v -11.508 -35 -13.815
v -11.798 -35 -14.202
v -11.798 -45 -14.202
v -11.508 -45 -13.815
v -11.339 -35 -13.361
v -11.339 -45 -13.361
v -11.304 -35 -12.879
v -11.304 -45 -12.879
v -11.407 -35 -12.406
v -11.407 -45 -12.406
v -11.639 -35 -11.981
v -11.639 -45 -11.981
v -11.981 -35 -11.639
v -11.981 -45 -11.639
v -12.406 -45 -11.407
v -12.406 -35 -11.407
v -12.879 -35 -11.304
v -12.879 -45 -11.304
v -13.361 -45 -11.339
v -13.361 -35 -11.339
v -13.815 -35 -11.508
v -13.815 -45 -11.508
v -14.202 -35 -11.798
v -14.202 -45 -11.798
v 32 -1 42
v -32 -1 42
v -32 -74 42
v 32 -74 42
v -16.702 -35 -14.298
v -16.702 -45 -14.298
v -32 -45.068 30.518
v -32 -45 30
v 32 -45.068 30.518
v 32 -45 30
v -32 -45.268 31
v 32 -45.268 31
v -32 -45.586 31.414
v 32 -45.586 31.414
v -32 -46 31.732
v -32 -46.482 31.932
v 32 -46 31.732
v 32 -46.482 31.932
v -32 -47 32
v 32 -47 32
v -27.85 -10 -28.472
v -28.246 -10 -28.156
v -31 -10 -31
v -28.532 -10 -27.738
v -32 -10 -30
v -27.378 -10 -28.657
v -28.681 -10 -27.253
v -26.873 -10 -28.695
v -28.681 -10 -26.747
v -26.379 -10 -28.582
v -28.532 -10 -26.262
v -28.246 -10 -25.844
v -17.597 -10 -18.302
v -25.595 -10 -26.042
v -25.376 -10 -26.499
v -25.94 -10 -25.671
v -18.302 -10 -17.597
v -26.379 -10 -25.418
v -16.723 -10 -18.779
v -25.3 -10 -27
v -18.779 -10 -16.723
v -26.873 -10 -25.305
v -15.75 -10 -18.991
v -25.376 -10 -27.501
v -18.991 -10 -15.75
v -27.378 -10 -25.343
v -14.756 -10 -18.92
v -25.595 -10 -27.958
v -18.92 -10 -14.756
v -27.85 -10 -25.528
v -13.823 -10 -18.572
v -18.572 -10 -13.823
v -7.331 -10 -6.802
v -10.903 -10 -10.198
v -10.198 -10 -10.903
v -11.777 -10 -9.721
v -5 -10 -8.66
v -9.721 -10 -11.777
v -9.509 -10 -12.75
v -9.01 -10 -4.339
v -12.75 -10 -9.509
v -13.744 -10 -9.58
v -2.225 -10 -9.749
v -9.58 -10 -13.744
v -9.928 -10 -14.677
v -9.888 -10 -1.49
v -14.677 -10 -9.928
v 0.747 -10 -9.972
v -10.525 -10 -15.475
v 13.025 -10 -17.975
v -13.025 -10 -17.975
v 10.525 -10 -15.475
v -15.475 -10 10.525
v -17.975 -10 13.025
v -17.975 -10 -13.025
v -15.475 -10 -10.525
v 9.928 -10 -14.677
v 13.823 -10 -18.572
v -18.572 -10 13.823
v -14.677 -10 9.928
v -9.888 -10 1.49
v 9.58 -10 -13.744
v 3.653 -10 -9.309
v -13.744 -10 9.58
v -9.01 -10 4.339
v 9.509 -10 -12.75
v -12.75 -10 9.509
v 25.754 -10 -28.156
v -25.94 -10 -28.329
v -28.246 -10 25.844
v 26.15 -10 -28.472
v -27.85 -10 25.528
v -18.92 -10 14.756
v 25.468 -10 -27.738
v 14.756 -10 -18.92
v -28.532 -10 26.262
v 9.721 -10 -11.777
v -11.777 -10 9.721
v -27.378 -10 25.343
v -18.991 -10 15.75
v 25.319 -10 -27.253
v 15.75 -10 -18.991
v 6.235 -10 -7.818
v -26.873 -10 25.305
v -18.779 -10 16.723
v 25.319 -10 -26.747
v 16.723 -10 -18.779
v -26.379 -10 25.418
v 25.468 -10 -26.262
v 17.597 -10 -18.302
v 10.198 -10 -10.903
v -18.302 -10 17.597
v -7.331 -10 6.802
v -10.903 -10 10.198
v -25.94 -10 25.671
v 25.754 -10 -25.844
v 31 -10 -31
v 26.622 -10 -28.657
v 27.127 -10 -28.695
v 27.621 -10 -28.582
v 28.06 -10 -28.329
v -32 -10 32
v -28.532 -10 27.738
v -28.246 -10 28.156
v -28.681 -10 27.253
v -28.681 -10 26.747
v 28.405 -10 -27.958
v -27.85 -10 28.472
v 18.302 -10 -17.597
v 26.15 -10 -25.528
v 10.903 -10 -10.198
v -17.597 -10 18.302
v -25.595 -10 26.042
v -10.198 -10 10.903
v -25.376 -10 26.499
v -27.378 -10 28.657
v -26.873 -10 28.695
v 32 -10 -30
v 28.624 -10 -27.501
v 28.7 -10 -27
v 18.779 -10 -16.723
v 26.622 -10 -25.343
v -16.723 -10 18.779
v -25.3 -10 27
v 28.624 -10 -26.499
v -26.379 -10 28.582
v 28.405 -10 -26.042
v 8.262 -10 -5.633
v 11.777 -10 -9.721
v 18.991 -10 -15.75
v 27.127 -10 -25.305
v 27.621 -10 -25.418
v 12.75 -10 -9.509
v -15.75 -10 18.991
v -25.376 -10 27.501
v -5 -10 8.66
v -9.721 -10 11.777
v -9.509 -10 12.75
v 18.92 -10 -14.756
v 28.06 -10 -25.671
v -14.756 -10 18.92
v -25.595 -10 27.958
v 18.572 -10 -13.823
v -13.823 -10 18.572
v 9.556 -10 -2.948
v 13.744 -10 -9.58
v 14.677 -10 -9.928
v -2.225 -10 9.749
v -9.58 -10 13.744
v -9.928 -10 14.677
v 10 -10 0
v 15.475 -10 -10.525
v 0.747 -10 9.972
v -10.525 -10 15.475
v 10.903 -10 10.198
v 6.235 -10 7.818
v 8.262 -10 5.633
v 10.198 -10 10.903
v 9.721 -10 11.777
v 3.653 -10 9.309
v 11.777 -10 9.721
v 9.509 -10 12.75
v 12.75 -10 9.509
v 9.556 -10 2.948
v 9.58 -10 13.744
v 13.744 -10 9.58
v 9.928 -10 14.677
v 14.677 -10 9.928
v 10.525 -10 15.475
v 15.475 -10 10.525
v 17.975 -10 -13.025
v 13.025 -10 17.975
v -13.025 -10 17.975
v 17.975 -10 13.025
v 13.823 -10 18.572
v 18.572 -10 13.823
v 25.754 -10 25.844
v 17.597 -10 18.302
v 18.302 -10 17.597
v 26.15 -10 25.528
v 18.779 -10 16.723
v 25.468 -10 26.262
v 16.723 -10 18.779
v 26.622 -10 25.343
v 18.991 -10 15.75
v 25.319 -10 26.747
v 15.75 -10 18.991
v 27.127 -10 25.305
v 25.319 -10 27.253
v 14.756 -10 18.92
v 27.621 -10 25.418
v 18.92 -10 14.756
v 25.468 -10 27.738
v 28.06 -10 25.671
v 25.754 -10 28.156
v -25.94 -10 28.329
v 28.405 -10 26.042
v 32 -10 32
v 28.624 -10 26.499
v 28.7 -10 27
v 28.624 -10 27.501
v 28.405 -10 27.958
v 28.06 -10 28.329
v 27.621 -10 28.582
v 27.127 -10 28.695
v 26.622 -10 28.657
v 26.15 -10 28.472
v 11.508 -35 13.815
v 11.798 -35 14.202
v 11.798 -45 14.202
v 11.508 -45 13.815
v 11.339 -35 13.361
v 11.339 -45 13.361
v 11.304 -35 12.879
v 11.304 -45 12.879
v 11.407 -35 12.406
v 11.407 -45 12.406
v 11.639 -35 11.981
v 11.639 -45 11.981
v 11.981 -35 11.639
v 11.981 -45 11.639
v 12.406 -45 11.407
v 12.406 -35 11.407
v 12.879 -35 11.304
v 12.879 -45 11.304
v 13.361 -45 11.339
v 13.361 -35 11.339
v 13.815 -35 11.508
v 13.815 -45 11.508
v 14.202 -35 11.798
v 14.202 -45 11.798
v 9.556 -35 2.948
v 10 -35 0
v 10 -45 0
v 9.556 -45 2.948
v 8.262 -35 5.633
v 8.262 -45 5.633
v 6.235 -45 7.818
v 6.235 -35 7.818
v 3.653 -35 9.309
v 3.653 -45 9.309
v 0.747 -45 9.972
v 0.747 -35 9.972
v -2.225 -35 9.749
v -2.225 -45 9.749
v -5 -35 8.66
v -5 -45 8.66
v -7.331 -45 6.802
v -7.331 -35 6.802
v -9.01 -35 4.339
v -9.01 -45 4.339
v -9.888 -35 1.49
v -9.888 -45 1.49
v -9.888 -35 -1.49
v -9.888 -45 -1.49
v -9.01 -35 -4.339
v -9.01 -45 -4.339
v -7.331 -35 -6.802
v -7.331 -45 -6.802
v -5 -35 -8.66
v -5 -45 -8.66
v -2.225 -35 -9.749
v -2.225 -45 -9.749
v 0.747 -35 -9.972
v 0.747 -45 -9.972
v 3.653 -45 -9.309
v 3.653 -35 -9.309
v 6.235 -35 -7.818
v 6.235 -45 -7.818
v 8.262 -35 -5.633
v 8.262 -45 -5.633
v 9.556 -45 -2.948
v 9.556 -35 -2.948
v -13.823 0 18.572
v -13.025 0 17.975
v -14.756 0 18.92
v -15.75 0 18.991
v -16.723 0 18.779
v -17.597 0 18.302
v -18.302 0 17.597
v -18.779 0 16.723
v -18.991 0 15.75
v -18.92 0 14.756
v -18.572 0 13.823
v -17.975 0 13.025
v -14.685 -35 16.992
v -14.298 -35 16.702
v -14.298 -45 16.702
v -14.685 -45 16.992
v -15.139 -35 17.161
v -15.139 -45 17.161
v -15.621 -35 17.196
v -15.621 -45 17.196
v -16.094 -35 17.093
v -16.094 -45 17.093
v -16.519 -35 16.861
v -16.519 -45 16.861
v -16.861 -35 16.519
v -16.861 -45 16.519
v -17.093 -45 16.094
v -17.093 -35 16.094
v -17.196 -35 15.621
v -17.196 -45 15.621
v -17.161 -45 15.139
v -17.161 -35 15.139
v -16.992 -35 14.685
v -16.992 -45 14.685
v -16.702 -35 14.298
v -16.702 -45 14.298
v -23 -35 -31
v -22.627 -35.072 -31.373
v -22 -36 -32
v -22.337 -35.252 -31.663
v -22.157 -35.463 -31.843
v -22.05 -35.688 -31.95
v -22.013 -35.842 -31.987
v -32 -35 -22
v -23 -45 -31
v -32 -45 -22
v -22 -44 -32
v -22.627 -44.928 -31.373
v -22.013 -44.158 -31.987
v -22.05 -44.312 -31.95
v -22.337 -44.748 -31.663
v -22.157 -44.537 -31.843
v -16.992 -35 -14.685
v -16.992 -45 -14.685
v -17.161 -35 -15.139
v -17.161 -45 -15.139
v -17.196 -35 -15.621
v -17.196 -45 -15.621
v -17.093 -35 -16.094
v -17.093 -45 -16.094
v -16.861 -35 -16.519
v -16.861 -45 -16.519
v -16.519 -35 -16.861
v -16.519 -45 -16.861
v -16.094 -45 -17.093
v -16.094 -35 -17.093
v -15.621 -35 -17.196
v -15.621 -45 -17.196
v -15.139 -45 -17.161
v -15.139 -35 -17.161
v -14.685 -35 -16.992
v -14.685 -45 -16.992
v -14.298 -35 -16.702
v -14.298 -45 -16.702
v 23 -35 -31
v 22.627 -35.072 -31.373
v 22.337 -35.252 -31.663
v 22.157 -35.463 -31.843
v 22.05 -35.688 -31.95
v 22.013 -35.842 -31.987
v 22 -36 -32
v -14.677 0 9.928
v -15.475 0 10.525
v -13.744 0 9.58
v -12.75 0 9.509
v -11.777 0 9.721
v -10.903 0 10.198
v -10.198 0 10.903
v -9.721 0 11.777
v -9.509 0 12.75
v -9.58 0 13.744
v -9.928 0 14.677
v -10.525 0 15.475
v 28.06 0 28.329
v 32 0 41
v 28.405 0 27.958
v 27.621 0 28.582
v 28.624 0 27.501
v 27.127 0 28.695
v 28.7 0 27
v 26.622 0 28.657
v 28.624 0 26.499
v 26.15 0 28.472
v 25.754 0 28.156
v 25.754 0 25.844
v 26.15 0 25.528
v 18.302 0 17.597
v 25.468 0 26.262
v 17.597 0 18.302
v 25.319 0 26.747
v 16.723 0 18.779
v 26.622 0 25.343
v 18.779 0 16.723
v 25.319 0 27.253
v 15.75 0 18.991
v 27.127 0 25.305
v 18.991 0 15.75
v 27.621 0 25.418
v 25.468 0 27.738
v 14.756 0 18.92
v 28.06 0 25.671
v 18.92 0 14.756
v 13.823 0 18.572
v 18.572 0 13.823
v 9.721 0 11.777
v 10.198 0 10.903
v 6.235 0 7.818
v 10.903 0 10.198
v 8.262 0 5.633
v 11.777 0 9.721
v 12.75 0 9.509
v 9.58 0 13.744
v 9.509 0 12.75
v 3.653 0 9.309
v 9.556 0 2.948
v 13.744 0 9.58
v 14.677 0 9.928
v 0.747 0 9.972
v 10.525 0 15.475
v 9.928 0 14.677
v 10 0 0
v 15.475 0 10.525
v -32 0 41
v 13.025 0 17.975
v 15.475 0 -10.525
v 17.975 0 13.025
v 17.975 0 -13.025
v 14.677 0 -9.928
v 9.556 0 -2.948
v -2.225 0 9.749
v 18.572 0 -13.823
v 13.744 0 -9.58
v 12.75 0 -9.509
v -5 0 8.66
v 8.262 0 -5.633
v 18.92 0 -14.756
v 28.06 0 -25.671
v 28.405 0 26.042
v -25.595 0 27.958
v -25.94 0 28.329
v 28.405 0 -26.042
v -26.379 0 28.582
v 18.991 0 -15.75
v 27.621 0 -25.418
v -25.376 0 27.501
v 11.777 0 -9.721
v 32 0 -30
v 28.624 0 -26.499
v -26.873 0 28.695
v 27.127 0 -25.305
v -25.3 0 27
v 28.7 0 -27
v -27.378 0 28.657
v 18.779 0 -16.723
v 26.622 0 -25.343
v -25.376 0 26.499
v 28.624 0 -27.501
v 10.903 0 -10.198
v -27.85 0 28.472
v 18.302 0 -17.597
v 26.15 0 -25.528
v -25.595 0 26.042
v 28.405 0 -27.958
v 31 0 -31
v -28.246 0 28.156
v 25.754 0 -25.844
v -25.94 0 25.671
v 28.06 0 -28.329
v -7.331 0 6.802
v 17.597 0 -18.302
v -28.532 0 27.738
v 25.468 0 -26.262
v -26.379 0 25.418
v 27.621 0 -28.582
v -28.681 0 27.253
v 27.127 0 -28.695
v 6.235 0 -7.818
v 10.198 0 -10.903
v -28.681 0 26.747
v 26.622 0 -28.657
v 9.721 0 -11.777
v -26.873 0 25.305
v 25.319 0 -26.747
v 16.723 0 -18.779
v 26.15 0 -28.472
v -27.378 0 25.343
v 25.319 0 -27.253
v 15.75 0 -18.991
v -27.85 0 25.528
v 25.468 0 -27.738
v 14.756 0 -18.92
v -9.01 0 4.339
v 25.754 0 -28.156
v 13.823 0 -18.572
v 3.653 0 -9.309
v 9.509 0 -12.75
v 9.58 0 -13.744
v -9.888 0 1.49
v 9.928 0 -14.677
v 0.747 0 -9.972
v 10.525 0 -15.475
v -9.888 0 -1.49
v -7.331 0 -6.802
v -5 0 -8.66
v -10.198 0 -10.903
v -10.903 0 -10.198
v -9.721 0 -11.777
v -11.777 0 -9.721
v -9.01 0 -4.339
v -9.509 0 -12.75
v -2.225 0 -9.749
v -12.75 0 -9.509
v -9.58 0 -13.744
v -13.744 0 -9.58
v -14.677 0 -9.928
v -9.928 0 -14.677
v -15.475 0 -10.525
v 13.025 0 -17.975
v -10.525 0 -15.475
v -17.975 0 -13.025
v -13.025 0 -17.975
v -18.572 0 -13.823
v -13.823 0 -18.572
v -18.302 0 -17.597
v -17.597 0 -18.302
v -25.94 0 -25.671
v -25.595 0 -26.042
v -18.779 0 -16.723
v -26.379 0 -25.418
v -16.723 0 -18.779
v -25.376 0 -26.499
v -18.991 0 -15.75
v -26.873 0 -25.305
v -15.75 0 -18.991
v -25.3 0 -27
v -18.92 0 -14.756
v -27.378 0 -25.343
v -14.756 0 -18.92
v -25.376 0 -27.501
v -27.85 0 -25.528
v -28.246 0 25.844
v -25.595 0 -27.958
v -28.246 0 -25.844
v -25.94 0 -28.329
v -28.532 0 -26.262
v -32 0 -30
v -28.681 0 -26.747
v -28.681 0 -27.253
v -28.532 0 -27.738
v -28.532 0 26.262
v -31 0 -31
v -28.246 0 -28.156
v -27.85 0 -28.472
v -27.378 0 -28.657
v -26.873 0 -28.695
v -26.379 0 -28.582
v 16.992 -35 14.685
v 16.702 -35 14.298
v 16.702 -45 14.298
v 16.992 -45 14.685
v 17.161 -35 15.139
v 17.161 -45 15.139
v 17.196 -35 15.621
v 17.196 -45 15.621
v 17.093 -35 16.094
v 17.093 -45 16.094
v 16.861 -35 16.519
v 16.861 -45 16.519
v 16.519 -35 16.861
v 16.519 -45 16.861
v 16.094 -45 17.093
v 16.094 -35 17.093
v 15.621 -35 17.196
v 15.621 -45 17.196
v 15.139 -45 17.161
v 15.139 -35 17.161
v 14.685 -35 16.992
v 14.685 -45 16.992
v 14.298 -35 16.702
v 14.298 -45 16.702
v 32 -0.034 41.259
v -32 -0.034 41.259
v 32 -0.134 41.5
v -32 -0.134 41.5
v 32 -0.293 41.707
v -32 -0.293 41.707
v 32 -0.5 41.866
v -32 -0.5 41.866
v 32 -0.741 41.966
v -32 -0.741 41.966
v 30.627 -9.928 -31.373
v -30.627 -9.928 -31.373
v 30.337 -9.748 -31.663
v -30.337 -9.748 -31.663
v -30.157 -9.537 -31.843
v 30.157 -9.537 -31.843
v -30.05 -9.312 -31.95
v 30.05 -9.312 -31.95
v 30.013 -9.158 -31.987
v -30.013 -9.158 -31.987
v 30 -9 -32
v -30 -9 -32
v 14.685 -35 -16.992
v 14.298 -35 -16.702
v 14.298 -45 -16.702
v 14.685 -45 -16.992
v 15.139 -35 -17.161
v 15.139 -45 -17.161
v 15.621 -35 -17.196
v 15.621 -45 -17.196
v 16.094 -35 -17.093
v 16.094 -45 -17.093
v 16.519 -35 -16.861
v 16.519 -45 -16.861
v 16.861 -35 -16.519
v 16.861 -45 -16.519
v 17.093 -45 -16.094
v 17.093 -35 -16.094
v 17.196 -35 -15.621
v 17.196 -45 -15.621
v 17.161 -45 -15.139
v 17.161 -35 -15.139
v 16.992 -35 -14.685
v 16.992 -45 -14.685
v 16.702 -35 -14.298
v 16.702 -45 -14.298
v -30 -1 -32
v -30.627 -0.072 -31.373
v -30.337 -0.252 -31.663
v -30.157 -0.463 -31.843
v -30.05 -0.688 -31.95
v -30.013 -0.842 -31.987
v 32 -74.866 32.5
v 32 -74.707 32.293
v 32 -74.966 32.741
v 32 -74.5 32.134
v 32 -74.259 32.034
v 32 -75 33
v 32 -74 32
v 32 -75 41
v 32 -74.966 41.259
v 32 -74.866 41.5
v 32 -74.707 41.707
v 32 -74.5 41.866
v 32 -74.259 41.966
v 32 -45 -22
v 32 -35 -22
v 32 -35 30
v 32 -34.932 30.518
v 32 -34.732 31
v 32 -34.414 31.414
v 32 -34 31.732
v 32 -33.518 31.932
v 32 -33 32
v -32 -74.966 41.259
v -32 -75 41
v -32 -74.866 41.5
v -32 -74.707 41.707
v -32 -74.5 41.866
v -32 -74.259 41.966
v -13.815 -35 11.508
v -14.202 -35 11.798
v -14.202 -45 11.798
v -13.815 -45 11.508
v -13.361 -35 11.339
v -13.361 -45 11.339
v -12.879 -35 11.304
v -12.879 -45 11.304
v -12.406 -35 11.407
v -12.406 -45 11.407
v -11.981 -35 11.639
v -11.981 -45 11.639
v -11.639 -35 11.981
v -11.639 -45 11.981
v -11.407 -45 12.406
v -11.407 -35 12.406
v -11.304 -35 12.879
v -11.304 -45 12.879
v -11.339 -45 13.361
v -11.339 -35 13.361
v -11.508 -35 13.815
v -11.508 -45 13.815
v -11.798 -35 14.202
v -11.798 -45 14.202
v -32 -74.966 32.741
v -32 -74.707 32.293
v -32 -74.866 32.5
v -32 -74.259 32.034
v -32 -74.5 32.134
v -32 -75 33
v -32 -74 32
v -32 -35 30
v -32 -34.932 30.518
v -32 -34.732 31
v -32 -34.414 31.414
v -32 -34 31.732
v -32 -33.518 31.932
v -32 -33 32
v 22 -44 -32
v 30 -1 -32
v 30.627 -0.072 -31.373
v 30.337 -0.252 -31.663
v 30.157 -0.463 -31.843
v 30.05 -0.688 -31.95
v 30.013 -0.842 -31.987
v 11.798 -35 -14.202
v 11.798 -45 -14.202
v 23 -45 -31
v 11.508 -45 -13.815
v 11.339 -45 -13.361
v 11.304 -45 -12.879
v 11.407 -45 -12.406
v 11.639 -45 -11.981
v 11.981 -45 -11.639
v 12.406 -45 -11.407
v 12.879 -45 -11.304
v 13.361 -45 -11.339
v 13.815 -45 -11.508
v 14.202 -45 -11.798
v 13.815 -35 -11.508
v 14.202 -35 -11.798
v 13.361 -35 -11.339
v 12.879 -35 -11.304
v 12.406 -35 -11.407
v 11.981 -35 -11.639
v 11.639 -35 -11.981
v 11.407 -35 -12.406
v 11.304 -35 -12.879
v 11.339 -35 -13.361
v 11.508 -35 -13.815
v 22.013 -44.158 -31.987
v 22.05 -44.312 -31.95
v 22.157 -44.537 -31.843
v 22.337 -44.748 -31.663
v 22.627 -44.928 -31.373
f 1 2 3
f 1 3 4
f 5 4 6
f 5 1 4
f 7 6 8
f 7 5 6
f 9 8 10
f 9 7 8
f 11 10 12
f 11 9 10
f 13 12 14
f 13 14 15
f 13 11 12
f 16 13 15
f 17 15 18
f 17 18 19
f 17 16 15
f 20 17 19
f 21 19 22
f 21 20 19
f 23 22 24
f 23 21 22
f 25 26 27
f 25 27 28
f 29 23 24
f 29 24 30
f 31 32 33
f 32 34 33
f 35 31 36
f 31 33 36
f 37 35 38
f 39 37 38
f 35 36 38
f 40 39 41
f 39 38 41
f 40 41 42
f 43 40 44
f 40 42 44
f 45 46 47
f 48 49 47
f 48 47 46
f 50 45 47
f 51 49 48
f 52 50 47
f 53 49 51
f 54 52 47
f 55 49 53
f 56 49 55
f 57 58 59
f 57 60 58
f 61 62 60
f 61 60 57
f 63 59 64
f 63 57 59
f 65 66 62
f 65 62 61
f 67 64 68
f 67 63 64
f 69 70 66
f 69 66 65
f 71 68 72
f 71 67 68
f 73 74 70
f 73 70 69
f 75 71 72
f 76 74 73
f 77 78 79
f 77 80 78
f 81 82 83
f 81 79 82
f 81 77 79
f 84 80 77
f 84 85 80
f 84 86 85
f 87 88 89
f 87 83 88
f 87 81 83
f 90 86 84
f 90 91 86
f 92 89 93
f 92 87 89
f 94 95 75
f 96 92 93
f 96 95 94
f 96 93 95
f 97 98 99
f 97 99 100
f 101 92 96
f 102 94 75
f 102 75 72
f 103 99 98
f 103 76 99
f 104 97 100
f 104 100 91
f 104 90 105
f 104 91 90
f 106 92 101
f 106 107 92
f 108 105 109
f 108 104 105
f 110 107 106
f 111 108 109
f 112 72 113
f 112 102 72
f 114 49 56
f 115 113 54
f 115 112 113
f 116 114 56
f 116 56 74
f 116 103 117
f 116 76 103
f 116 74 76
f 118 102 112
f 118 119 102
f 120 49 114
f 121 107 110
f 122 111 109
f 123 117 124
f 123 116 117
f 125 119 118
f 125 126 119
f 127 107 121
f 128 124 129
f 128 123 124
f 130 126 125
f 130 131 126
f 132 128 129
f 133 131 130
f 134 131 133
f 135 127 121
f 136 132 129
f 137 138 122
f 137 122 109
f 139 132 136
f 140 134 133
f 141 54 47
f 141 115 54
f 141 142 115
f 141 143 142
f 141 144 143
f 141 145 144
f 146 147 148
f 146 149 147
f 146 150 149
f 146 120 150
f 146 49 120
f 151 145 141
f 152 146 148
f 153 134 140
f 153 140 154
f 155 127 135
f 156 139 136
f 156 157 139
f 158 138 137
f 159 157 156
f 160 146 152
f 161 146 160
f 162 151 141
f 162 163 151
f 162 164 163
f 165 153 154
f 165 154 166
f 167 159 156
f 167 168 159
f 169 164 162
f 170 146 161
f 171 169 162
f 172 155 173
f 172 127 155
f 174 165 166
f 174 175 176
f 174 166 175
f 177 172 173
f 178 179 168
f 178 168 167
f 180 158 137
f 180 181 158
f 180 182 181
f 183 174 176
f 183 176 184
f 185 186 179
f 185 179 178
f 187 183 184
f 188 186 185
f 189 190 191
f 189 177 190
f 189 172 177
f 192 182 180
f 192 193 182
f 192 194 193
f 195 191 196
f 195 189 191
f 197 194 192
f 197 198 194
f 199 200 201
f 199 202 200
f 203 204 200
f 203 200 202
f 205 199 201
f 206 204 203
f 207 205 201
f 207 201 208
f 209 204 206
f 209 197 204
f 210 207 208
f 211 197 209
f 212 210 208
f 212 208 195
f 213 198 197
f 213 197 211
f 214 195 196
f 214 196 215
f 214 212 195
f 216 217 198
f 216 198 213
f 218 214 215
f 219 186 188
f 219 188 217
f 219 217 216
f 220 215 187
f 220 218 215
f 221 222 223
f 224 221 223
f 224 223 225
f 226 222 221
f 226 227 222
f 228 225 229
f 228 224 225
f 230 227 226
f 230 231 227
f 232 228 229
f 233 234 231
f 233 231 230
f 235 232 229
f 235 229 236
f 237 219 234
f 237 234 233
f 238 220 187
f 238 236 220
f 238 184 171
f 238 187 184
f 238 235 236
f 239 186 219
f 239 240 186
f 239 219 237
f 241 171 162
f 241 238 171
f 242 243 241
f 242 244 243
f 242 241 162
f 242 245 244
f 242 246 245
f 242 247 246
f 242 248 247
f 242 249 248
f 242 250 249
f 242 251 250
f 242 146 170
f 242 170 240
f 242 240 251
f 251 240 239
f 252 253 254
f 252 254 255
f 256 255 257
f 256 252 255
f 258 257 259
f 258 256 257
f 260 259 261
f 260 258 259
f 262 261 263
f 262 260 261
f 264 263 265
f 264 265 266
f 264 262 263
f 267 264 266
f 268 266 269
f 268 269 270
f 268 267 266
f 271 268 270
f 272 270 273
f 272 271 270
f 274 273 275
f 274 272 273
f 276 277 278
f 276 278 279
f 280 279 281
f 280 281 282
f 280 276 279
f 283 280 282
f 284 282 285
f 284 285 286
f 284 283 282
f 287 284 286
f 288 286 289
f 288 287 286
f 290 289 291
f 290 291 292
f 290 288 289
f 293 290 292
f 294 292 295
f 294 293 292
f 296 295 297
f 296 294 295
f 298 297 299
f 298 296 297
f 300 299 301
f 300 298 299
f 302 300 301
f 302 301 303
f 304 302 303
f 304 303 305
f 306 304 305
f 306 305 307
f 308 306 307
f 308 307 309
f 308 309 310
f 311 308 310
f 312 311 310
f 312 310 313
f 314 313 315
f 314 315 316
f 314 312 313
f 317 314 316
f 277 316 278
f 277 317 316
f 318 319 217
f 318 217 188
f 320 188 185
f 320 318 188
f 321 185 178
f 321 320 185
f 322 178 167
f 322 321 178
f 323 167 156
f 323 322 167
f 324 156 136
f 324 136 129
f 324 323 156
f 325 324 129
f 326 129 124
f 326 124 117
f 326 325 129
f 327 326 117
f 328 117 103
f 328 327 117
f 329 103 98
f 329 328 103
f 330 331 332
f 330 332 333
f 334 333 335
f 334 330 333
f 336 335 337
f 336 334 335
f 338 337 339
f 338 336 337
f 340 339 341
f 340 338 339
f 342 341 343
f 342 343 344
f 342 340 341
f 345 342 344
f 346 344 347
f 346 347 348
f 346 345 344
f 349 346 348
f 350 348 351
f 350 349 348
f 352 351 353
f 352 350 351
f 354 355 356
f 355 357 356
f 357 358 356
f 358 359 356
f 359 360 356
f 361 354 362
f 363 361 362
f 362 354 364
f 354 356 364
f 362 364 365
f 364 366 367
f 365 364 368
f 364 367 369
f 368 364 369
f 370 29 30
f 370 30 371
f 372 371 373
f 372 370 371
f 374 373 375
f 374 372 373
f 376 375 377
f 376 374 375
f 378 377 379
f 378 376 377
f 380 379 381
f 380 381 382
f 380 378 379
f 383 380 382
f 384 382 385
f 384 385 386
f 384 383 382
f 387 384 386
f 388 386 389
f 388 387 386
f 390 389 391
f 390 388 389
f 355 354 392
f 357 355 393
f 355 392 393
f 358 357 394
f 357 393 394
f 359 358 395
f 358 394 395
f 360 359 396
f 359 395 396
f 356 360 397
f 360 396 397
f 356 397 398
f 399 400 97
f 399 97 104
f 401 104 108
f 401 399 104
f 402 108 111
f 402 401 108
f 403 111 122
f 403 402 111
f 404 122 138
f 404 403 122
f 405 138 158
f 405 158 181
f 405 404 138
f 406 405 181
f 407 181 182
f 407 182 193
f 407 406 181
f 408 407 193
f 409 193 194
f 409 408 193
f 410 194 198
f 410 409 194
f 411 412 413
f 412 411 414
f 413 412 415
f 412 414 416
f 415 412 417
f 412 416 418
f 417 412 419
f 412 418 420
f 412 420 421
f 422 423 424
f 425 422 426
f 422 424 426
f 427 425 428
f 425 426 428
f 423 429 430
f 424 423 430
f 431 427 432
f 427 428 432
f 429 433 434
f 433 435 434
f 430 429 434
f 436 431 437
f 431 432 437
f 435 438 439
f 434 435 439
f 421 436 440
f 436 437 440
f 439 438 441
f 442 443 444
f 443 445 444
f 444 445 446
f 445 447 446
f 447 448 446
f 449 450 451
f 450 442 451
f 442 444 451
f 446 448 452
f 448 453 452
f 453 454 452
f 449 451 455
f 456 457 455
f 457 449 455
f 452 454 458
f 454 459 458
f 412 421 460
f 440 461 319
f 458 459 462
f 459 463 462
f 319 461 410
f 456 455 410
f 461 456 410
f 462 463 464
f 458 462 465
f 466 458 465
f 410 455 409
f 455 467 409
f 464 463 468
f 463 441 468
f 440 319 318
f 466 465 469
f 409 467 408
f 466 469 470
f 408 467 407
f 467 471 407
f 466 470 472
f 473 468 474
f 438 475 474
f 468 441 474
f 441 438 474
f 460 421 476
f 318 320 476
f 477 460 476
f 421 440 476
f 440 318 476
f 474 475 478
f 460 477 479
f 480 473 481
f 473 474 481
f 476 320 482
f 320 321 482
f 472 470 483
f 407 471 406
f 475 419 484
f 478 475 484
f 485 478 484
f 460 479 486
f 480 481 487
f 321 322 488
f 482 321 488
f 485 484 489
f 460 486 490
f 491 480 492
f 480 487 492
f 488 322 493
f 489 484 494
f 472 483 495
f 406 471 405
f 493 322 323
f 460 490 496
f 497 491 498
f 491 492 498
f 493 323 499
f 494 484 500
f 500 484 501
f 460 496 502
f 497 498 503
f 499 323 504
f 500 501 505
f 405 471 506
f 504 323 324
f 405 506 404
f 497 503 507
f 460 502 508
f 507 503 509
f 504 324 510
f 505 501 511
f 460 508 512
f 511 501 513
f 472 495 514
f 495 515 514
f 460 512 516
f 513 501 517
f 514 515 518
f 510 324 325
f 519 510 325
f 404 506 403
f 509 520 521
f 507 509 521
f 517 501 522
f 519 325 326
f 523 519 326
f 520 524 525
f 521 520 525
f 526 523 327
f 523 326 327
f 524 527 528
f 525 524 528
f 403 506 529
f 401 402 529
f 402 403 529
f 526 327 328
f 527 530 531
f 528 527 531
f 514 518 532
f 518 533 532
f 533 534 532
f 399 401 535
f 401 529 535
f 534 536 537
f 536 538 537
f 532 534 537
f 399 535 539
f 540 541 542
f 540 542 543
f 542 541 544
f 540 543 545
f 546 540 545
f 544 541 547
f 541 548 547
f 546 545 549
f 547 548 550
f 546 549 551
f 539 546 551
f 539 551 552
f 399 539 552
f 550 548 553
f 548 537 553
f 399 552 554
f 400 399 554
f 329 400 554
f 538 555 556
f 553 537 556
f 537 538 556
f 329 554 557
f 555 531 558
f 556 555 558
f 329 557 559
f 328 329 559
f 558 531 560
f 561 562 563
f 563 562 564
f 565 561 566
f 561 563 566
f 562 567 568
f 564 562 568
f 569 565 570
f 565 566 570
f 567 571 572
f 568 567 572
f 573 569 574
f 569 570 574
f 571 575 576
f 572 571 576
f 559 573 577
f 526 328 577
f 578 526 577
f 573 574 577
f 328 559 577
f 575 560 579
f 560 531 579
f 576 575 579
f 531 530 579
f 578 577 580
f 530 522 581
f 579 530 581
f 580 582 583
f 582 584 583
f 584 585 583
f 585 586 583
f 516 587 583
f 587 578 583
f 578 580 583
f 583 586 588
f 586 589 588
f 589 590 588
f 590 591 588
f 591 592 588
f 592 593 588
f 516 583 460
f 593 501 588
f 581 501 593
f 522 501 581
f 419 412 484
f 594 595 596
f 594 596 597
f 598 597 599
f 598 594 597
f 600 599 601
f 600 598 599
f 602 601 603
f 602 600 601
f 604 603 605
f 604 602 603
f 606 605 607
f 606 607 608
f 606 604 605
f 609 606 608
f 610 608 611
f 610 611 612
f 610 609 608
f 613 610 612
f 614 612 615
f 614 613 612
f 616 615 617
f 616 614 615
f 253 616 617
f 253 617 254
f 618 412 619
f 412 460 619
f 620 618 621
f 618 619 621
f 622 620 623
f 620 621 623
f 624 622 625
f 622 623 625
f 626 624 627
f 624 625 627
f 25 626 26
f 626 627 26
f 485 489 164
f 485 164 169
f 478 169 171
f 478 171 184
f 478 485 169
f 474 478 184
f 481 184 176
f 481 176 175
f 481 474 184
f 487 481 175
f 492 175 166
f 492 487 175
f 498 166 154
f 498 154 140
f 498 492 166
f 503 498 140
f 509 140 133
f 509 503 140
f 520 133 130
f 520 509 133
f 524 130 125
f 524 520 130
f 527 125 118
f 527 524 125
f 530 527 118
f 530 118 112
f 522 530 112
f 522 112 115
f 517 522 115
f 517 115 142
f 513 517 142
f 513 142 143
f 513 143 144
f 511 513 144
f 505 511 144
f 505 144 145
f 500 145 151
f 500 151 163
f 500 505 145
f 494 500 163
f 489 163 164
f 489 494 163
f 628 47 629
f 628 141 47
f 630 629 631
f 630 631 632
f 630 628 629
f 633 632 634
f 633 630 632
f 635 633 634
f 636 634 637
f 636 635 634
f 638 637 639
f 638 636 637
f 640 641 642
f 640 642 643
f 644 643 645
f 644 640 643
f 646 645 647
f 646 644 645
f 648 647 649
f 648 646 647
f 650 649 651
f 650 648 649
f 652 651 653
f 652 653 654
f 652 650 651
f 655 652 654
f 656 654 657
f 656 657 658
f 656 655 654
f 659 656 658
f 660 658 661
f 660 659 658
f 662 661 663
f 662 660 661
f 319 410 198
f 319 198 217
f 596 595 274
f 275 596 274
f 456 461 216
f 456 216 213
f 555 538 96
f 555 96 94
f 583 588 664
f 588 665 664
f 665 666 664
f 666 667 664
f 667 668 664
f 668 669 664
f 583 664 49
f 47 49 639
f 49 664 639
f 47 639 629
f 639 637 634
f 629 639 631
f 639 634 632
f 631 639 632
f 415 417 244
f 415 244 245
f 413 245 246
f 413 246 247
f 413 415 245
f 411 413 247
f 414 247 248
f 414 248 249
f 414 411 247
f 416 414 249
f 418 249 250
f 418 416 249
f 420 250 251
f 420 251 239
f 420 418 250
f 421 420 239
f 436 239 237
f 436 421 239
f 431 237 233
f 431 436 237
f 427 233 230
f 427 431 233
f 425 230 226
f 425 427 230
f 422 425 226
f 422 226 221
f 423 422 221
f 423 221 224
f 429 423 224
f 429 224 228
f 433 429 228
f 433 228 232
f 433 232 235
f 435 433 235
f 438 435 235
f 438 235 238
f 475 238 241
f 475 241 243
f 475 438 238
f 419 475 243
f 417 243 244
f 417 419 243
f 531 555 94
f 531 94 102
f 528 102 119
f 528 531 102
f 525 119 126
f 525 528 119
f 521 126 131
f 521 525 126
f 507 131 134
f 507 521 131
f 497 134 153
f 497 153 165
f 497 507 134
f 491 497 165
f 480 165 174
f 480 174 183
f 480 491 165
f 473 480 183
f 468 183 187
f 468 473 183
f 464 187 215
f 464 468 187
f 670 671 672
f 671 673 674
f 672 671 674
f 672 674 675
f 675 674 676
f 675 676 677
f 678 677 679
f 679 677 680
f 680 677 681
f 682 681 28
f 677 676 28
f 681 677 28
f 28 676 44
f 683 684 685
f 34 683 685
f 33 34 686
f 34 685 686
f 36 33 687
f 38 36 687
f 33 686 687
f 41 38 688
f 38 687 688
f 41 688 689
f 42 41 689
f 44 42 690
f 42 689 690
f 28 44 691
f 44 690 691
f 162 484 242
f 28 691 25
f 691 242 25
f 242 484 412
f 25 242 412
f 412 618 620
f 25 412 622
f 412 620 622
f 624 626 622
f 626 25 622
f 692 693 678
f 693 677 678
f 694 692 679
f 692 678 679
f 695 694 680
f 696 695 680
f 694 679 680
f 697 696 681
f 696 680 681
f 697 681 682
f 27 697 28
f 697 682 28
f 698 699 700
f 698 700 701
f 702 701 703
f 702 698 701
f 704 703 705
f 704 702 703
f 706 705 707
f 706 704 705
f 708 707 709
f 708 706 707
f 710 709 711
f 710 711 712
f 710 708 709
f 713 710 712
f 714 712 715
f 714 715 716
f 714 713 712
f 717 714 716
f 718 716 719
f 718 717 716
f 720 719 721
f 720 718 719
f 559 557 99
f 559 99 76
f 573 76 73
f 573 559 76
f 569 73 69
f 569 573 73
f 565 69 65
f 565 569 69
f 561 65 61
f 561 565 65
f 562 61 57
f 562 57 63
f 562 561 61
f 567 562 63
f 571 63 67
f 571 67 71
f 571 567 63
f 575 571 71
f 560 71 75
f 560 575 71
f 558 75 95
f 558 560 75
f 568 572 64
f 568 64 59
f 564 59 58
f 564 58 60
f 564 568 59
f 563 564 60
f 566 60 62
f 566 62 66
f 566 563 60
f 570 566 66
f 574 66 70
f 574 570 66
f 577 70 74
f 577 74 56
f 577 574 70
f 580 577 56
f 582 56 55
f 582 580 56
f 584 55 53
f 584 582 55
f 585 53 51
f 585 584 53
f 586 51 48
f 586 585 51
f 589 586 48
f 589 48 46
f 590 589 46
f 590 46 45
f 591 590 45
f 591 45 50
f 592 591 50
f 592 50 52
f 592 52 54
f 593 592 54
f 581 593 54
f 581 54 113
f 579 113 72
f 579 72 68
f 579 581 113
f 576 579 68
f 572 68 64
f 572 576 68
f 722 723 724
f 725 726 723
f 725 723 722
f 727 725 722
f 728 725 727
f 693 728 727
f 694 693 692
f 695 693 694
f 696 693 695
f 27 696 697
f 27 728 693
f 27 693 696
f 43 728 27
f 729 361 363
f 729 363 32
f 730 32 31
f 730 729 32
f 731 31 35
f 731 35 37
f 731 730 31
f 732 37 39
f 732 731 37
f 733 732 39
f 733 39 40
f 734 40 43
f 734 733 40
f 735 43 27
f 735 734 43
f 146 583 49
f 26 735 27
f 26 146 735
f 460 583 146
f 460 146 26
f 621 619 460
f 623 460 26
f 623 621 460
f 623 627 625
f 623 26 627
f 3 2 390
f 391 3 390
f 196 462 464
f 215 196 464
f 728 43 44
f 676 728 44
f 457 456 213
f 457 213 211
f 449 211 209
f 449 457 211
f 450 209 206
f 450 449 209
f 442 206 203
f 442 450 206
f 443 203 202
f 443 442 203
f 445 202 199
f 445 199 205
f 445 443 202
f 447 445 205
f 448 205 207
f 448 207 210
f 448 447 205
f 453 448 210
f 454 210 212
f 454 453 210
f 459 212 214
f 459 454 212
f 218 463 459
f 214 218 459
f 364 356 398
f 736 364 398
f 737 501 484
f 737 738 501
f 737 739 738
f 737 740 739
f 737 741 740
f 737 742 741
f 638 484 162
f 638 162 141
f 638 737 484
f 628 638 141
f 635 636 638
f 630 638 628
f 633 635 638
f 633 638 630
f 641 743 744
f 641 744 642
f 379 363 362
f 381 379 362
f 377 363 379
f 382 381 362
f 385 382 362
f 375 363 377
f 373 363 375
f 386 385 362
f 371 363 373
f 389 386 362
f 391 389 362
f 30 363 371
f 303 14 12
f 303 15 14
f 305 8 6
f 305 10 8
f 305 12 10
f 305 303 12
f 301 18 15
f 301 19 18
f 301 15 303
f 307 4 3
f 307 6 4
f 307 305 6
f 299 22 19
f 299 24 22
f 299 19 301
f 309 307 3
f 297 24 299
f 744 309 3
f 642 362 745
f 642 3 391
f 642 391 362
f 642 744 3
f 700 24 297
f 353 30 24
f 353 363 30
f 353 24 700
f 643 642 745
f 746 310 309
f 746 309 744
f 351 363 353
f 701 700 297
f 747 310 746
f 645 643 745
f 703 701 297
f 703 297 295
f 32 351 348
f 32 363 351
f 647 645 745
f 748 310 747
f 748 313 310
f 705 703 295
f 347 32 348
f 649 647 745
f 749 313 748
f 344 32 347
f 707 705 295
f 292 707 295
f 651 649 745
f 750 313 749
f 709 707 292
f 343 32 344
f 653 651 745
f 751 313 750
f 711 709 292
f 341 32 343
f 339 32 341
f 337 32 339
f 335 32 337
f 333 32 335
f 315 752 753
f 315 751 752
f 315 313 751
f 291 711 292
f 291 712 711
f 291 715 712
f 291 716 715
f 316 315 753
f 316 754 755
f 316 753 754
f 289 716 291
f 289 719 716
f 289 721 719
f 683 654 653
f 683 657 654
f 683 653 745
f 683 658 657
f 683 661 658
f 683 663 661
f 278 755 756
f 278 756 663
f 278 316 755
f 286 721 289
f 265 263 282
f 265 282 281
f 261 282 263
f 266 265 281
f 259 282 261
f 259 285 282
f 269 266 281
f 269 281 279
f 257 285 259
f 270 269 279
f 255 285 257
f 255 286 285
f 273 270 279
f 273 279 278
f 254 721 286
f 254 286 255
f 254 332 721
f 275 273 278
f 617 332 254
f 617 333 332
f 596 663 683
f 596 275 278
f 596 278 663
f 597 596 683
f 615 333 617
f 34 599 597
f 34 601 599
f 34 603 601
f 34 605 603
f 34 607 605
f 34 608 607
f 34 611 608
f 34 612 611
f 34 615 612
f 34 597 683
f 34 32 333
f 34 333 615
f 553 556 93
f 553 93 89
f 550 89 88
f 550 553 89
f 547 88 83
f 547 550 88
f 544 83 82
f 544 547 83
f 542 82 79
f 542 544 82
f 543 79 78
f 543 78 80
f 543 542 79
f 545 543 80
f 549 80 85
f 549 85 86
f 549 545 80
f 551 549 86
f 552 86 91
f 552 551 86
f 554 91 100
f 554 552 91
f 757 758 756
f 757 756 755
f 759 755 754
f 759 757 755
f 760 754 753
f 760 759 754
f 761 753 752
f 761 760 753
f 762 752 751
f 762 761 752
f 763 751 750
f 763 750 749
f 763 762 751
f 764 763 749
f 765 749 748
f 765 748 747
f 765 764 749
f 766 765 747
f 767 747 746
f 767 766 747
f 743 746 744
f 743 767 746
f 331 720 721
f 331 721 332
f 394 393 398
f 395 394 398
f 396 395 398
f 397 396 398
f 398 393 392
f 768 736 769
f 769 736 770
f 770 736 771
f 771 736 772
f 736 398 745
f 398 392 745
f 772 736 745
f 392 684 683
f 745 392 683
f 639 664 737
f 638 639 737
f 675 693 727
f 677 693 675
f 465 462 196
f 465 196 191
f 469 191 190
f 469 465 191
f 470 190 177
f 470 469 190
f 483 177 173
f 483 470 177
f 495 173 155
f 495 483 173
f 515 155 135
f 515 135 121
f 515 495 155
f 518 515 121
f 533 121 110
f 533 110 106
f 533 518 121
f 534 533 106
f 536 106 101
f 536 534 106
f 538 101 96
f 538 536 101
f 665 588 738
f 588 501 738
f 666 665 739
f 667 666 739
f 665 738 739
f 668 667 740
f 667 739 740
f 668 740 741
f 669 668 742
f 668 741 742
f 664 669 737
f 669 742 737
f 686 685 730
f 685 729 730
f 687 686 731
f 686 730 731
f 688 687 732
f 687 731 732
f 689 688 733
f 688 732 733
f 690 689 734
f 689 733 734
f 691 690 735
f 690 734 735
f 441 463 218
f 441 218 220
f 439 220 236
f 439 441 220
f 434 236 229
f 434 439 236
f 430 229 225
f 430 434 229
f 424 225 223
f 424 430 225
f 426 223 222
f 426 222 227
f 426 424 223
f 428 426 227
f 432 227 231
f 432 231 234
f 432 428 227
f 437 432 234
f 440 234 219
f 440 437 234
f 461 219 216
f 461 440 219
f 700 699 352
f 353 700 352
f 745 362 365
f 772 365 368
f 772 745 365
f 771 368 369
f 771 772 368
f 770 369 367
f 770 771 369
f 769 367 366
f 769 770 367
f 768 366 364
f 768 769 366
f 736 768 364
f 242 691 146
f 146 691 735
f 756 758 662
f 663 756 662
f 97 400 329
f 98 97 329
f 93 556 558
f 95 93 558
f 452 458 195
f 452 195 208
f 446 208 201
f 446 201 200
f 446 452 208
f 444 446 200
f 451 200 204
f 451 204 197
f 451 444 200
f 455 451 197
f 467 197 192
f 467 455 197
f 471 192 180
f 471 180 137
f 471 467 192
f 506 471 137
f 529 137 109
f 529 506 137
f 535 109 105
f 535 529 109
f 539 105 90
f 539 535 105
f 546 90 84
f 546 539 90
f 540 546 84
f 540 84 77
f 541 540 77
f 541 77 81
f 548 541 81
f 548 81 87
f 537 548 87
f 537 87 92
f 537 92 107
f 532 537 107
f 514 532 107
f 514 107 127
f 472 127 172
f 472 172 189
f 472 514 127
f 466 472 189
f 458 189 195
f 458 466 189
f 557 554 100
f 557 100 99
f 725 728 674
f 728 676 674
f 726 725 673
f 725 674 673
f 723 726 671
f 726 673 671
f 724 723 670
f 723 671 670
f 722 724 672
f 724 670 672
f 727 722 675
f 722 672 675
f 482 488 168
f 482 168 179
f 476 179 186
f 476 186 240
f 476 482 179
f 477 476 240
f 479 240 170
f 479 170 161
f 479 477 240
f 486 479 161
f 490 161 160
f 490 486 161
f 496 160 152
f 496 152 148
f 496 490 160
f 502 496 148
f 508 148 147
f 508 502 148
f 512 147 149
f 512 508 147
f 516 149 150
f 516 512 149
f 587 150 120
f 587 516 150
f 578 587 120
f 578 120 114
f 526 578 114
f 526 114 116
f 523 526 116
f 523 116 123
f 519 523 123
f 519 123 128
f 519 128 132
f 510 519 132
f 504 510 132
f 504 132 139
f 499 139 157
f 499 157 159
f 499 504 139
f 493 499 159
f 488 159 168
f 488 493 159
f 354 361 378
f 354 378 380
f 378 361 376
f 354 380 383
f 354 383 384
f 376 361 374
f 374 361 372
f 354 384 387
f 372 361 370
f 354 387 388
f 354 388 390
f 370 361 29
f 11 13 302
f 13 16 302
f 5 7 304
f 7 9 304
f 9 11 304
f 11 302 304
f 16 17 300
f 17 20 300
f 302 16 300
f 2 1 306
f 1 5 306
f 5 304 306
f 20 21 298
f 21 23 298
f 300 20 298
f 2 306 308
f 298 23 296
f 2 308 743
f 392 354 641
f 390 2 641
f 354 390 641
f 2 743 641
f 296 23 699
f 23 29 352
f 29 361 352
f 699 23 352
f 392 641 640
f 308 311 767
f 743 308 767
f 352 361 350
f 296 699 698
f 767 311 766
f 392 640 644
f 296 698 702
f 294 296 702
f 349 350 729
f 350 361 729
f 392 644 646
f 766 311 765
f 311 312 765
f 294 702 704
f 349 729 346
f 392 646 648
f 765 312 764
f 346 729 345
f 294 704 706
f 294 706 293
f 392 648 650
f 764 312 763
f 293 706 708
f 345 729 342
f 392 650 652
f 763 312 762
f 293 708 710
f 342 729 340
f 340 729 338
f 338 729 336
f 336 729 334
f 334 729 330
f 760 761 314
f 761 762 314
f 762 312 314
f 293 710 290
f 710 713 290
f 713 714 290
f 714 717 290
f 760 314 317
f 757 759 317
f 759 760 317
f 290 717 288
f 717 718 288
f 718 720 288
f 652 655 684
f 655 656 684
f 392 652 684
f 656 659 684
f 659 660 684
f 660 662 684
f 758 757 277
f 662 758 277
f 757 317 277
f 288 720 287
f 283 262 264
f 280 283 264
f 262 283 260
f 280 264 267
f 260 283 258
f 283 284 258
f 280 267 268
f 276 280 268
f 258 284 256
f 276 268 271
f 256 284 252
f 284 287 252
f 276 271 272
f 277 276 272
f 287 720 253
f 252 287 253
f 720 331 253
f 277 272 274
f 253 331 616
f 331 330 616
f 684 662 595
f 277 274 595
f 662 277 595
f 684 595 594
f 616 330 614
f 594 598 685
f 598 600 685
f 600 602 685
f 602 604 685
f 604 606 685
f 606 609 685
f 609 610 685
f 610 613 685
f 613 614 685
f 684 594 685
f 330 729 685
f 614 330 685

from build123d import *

# Parameters (mm, degrees)
SKETCH_W        = 64
SKETCH_H        = 64
SKETCH_R        = 10
SKETCH_R_2      = 1.7
PAD_DEPTH       = 10
SKETCH001_W     = 64
SKETCH001_H     = 35
PAD001_DEPTH    = 10
SKETCH002_W     = 64
SKETCH002_H     = 74
SKETCH002_R     = 10
PAD002_DEPTH    = 10
SKETCH003_W     = 64
SKETCH003_H     = 10
PAD003_DEPTH    = 30
CHAMFER_SIZE    = 2
CHAMFER001_SIZE = 10
FILLET_R        = 2
FILLET001_R     = 1


with BuildPart() as part:
    # Sketch → Pad (new body)
    with BuildSketch(Plane.XZ):
        Rectangle(SKETCH_W, SKETCH_H)
        Circle(SKETCH_R, mode=Mode.SUBTRACT)
        with Locations((27, 27)):
            Circle(SKETCH_R_2, mode=Mode.SUBTRACT)
        with Locations((-27, -27)):
            Circle(SKETCH_R_2, mode=Mode.SUBTRACT)
        with Locations((-27, 27)):
            Circle(SKETCH_R_2, mode=Mode.SUBTRACT)
        with Locations((27, -27)):
            Circle(SKETCH_R_2, mode=Mode.SUBTRACT)
        with BuildLine():
            ThreePointArc((10.525126, 15.474874), (10.525126, 10.525126), (15.474874, 10.525126))
            Line((17.974874, 13.025126), (15.474874, 10.525126))
            ThreePointArc((17.974874, 13.025126), (17.974874, 17.974874), (13.025126, 17.974874))
            Line((13.025126, 17.974874), (10.525126, 15.474874))
        make_face(mode=Mode.SUBTRACT)
        with BuildLine():
            ThreePointArc((-13.025126, 17.974874), (-17.974874, 17.974874), (-17.974874, 13.025126))
            Line((-15.474874, 10.525126), (-17.974874, 13.025126))
            ThreePointArc((-15.474874, 10.525126), (-10.525126, 10.525126), (-10.525126, 15.474874))
            Line((-10.525126, 15.474874), (-13.025126, 17.974874))
        make_face(mode=Mode.SUBTRACT)
        with BuildLine():
            ThreePointArc((13.025126, -17.974874), (17.974874, -17.974874), (17.974874, -13.025126))
            Line((15.474874, -10.525126), (17.974874, -13.025126))
            ThreePointArc((15.474874, -10.525126), (10.525126, -10.525126), (10.525126, -15.474874))
            Line((10.525126, -15.474874), (13.025126, -17.974874))
        make_face(mode=Mode.SUBTRACT)
        with BuildLine():
            ThreePointArc((-17.974874, -13.025126), (-17.974874, -17.974874), (-13.025126, -17.974874))
            Line((-10.525126, -15.474874), (-13.025126, -17.974874))
            ThreePointArc((-10.525126, -15.474874), (-10.525126, -10.525126), (-15.474874, -10.525126))
            Line((-15.474874, -10.525126), (-17.974874, -13.025126))
        make_face(mode=Mode.SUBTRACT)
    extrude(amount=PAD_DEPTH)

    # Sketch001 (on Face3 of Pad) → Pad001 (join)
    with BuildSketch(Plane(origin=(0, 0, 32), x_dir=(-1, 0, 0), z_dir=(0, 0, 1))):
        with Locations((0, 17.5)):
            Rectangle(SKETCH001_W, SKETCH001_H)
    extrude(amount=PAD001_DEPTH)

    # Sketch002 (on Face31 of Pad001) → Pad002 (join)
    with BuildSketch(Plane.XZ.offset(35)):
        with Locations((0, 5)):
            Rectangle(SKETCH002_W, SKETCH002_H)
        Circle(SKETCH002_R, mode=Mode.SUBTRACT)
        with BuildLine():
            ThreePointArc((11.797918, 14.202082), (11.797918, 11.797918), (14.202082, 11.797918))
            Line((16.702082, 14.297918), (14.202082, 11.797918))
            ThreePointArc((16.702082, 14.297918), (16.702082, 16.702082), (14.297918, 16.702082))
            Line((14.297918, 16.702082), (11.797918, 14.202082))
        make_face(mode=Mode.SUBTRACT)
        with BuildLine():
            ThreePointArc((14.297918, -16.702082), (16.702082, -16.702082), (16.702082, -14.297918))
            Line((14.202082, -11.797918), (16.702082, -14.297918))
            ThreePointArc((14.202082, -11.797918), (11.797918, -11.797918), (11.797918, -14.202082))
            Line((11.797918, -14.202082), (14.297918, -16.702082))
        make_face(mode=Mode.SUBTRACT)
        with BuildLine():
            ThreePointArc((-14.297918, 16.702082), (-16.702082, 16.702082), (-16.702082, 14.297918))
            Line((-14.202082, 11.797918), (-16.702082, 14.297918))
            ThreePointArc((-14.202082, 11.797918), (-11.797918, 11.797918), (-11.797918, 14.202082))
            Line((-11.797918, 14.202082), (-14.297918, 16.702082))
        make_face(mode=Mode.SUBTRACT)
        with BuildLine():
            ThreePointArc((-16.702082, -14.297918), (-16.702082, -16.702082), (-14.297918, -16.702082))
            Line((-11.797918, -14.202082), (-14.297918, -16.702082))
            ThreePointArc((-11.797918, -14.202082), (-11.797918, -11.797918), (-14.202082, -11.797918))
            Line((-14.202082, -11.797918), (-16.702082, -14.297918))
        make_face(mode=Mode.SUBTRACT)
    extrude(amount=PAD002_DEPTH)

    # Sketch003 (on Face37 of Pad002) → Pad003 (join)
    with BuildSketch(Plane.XZ.offset(45)):
        with Locations((0, 37)):
            Rectangle(SKETCH003_W, SKETCH003_H)
    extrude(amount=PAD003_DEPTH)

    # Chamfer
    chamfer_edges = [part.edges().sort_by_distance(p)[0] for p in [
        (32, -5, -32),
        (-32, -5, -32),
    ]]
    chamfer(chamfer_edges, length=CHAMFER_SIZE)

    # Chamfer001
    chamfer001_edges = [part.edges().sort_by_distance(p)[0] for p in [
        (-32, -40, -32),
        (32, -40, -32),
    ]]
    chamfer(chamfer001_edges, length=CHAMFER001_SIZE)

    # Fillet
    fillet_edges = [part.edges().sort_by_distance(p)[0] for p in [
        (0, -35, 32),
        (0, -45, 32),
    ]]
    fillet(fillet_edges, radius=FILLET_R)

    # Fillet001
    fillet001_edges = [part.edges().sort_by_distance(p)[0] for p in [
        (0, -75, 42),
        (0, -75, 32),
        (0, 0, 42),
        (0, -35, -32),
        (0, 0, -32),
        (0, -45, -32),
        (0, -10, -32),
    ]]
    fillet(fillet001_edges, radius=FILLET001_R)


solid = part.part
